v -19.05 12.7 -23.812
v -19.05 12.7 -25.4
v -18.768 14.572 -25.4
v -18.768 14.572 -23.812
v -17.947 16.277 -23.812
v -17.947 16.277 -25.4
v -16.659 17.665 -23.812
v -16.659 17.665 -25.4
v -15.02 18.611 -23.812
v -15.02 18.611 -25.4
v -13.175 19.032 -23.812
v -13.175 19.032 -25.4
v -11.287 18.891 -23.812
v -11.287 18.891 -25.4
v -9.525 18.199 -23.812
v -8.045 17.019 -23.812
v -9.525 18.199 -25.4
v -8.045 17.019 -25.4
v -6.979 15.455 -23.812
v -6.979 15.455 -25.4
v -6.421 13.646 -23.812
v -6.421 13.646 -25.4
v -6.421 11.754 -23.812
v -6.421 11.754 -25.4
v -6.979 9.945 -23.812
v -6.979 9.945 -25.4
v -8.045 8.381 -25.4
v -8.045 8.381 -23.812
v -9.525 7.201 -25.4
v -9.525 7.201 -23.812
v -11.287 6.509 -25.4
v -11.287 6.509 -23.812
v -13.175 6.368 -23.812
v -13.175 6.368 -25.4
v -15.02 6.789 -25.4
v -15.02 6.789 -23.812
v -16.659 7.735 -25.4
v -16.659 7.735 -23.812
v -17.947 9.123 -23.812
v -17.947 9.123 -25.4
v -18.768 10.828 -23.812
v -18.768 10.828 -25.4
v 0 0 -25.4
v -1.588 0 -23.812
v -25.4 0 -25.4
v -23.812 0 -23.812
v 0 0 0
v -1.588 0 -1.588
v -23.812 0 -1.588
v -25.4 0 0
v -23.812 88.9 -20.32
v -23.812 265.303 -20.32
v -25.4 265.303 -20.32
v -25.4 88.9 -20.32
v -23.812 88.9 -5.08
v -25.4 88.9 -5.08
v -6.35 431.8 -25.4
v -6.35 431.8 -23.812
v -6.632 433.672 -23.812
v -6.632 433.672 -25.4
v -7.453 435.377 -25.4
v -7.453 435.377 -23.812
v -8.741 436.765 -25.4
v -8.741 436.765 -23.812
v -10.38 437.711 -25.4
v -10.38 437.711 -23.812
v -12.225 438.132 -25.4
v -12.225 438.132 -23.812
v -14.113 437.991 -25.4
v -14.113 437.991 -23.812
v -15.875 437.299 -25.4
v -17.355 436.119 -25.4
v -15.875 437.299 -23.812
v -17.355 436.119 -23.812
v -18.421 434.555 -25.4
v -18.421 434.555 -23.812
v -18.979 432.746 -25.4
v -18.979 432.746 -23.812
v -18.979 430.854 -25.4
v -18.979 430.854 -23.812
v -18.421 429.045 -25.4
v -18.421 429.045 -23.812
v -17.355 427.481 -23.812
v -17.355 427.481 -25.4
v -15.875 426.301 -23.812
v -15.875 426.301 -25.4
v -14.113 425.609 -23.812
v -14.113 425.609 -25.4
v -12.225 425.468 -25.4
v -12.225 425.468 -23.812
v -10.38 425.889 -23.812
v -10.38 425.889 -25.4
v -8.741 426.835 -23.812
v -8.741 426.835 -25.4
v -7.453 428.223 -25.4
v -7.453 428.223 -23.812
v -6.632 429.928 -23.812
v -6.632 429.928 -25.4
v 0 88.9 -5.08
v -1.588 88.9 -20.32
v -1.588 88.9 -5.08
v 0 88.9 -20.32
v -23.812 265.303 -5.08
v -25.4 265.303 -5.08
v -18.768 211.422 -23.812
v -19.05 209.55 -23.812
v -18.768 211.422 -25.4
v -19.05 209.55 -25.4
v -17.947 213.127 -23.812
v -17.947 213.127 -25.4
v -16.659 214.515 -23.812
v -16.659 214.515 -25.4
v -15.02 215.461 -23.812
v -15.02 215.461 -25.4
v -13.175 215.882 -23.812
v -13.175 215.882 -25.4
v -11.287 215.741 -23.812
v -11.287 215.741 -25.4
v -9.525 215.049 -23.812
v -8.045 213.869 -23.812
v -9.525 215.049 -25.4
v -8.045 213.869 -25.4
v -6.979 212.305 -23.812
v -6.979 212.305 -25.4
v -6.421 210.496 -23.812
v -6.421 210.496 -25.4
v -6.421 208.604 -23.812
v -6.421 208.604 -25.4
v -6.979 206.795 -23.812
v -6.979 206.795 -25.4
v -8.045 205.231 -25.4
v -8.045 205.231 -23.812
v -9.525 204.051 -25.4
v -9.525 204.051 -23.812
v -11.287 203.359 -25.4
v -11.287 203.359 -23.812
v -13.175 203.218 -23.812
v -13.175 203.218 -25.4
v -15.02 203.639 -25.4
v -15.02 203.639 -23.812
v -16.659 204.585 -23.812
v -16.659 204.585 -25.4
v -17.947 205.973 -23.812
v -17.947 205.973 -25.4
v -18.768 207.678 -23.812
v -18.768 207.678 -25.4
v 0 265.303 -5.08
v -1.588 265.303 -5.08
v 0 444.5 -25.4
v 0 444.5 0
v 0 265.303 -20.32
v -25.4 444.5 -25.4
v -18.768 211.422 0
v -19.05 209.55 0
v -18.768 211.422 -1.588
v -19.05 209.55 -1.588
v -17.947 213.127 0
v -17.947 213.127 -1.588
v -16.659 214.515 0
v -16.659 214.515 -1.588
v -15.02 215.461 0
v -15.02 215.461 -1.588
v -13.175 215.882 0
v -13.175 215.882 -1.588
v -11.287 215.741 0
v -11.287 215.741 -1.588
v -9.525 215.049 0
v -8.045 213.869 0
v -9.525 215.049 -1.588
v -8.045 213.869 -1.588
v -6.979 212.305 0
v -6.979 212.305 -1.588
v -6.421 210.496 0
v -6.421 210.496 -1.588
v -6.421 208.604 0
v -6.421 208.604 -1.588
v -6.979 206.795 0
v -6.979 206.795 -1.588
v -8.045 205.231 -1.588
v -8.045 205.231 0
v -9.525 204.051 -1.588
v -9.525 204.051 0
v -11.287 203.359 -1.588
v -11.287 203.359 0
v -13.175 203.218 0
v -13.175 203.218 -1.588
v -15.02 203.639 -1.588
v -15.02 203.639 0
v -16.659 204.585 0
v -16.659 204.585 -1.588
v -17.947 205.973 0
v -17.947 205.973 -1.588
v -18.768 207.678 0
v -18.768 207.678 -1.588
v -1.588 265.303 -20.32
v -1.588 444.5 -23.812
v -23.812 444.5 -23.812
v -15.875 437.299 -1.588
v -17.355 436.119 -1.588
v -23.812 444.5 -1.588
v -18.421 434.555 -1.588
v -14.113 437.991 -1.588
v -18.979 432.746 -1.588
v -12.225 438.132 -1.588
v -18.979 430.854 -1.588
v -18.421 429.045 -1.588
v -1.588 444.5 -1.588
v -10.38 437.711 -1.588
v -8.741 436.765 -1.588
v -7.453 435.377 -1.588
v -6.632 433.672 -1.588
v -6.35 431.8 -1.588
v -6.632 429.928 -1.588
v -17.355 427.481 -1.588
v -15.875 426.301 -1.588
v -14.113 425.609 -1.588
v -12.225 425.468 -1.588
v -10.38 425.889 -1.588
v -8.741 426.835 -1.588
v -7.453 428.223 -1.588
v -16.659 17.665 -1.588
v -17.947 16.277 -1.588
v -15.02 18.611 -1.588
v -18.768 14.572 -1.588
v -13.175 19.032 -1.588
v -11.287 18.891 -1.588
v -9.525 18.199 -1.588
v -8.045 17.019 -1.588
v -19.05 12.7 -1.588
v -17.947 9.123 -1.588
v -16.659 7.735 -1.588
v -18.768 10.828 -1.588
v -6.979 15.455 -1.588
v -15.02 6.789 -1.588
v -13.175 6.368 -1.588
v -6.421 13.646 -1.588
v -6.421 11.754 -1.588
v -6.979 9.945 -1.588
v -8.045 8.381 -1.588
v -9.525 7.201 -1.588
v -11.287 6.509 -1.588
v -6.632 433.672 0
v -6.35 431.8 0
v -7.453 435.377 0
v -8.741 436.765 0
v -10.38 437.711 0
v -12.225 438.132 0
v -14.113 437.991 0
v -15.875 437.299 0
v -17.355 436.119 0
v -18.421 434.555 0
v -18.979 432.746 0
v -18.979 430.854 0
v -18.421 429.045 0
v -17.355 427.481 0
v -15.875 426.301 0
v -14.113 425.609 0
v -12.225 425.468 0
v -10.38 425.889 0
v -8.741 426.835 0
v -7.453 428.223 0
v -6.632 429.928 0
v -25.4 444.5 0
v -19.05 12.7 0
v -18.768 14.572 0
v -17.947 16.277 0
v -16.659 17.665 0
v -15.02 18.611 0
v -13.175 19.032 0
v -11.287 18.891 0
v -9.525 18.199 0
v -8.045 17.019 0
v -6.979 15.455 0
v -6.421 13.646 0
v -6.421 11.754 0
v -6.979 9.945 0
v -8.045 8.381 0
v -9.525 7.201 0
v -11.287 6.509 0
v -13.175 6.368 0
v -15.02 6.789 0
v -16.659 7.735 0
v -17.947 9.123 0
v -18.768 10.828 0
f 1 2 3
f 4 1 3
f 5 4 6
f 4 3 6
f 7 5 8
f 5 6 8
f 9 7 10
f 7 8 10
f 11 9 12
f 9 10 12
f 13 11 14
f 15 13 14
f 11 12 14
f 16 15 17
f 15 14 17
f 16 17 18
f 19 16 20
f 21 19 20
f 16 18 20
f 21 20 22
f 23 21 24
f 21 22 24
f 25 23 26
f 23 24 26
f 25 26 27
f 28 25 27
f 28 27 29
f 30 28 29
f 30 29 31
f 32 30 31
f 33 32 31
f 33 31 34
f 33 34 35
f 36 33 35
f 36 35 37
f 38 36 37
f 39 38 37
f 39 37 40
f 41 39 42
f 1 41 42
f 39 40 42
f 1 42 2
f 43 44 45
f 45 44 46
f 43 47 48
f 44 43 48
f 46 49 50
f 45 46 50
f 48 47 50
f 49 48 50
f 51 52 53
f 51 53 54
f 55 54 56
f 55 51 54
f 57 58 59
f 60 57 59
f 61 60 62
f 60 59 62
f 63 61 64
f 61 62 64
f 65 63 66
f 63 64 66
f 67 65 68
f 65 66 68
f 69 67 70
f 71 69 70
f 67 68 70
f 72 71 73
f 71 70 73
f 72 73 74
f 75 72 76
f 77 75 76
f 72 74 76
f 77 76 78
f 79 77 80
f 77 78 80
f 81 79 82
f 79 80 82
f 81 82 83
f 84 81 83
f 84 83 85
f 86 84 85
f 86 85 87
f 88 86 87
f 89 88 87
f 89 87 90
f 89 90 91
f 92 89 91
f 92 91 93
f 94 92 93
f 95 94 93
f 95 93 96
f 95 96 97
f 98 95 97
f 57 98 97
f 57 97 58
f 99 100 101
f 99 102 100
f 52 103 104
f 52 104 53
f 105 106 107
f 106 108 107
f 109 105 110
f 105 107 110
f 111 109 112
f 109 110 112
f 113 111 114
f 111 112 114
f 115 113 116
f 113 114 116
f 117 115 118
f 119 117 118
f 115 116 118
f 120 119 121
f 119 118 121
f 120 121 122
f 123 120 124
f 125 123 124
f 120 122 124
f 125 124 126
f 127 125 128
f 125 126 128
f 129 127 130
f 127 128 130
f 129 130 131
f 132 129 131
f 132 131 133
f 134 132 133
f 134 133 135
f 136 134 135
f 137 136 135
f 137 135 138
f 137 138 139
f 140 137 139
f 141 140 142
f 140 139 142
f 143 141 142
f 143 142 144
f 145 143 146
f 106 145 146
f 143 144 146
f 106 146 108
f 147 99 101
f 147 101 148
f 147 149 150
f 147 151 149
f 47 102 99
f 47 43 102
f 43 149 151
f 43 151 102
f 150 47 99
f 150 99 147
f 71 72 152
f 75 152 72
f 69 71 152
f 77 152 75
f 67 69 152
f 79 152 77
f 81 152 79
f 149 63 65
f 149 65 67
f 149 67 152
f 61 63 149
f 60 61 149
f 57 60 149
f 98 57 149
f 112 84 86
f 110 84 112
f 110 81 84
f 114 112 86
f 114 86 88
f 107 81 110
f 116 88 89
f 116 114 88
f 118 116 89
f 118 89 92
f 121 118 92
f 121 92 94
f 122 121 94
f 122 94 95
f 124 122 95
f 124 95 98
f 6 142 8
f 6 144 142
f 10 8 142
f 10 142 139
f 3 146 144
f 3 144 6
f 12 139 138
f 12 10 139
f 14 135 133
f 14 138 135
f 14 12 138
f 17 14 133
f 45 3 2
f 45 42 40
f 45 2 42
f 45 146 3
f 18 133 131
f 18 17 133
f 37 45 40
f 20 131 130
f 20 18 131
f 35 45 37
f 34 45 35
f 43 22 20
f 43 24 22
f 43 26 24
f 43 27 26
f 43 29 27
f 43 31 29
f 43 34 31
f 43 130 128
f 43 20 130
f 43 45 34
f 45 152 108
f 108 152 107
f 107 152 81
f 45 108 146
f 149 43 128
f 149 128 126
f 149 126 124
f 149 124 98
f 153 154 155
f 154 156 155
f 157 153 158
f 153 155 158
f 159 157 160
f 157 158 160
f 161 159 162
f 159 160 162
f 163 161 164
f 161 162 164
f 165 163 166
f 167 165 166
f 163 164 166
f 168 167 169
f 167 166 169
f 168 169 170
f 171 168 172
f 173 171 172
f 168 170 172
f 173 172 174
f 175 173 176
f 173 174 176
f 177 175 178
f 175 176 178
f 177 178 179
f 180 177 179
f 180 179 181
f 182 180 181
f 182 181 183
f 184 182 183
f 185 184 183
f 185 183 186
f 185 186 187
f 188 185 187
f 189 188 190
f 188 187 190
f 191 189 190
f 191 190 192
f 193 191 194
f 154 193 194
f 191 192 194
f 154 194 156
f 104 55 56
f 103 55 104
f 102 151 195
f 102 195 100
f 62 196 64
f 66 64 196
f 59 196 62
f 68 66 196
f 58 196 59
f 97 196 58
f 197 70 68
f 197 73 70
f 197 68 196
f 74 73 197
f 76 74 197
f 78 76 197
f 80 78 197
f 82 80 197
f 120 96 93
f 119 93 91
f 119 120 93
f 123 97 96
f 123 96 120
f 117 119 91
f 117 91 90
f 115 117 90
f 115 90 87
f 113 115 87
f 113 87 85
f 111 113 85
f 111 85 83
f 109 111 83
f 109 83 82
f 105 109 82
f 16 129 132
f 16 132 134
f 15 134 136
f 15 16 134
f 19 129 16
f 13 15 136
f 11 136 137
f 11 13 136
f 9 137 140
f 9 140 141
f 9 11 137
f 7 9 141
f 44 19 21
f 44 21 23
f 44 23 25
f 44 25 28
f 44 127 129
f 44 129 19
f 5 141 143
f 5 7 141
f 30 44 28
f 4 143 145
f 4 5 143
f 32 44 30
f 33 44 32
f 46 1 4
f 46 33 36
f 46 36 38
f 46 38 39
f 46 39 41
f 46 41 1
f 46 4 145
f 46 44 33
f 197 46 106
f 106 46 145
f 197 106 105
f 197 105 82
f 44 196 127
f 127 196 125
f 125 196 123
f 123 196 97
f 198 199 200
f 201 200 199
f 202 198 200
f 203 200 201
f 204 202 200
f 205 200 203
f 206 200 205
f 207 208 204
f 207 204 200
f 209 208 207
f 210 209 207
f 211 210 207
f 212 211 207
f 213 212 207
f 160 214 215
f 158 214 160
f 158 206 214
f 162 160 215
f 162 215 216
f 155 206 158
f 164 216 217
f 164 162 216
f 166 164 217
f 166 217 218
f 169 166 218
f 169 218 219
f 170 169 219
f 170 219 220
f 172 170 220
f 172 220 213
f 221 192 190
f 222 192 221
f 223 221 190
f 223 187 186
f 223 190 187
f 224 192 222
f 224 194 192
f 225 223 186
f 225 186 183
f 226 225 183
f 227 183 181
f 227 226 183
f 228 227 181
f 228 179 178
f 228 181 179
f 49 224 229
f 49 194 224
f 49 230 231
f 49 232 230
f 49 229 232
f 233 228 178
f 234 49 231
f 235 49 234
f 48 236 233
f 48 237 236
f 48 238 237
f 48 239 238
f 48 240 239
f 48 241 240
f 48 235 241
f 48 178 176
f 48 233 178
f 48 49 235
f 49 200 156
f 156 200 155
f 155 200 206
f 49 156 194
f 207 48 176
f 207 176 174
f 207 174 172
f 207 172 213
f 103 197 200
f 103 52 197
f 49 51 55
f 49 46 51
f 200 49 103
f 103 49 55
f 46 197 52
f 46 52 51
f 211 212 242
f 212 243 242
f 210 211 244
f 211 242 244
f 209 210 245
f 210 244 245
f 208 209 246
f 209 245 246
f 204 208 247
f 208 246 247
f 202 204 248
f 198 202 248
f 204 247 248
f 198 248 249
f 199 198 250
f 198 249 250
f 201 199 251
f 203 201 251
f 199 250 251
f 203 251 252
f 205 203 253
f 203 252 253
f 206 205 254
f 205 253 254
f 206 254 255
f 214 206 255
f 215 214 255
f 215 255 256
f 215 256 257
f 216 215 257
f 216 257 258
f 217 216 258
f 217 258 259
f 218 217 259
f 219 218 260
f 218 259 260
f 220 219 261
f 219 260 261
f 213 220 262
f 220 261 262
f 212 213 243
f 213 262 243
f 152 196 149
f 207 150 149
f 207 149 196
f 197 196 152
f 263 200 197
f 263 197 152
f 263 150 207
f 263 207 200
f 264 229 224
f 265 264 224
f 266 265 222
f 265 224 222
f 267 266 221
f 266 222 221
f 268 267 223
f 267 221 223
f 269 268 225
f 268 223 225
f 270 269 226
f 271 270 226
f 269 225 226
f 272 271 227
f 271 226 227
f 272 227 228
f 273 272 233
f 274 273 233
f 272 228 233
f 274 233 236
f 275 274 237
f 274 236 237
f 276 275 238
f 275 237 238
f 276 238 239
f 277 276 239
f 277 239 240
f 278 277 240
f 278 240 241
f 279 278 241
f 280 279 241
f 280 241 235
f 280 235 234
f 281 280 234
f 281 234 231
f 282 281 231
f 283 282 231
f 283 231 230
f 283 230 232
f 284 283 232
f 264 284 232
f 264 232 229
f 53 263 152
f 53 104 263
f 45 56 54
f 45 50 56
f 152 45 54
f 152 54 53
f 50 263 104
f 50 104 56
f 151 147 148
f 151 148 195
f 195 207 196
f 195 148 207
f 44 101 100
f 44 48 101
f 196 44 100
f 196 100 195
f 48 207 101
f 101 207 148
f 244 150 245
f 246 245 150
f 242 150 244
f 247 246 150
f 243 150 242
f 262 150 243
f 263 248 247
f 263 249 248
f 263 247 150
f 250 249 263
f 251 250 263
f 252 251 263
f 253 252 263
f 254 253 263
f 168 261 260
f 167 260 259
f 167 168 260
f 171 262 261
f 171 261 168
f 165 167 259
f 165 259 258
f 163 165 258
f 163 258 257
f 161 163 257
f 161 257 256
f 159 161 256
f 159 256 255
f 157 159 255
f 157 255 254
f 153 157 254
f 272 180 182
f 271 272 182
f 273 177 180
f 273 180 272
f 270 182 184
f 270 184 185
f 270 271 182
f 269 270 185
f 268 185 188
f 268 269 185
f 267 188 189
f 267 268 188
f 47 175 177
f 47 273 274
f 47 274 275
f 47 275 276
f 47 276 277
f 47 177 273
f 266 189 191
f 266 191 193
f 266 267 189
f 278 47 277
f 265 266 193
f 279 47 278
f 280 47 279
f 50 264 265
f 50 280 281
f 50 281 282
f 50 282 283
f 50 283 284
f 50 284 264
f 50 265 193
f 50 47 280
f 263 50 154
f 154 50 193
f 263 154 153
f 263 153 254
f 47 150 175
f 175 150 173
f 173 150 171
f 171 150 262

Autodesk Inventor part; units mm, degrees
ref_plane "YZ Plane" through (0, 0, 0) normal (1, 0, 0) x (0, 1, 0)
ref_plane "XZ Plane" through (0, 0, 0) normal (0, 1, 0) x (-1, 0, 0)
ref_plane "XY Plane" through (0, 0, 0) normal (0, 0, 1) x (1, 0, 0)
sketch "Sketch1" plane through (0, 0, 0) normal (0, 1, 0) x (-1, 0, 0)
  line L0 (0, 0) -> (25.4, 0)
  line L1 (25.4, 0) -> (25.4, -25.4)
  line L2 (25.4, -25.4) -> (0, -25.4)
  line L3 (0, -25.4) -> (0, 0)
  line L4 (23.8125, -23.8125) -> (23.8125, -1.5875)
  line L5 (23.8125, -1.5875) -> (1.5875, -1.5875)
  line L6 (1.5875, -1.5875) -> (1.5875, -23.8125)
  line L7 (1.5875, -23.8125) -> (23.8125, -23.8125)
  dimension "d0" = 25.4
  dimension "d1" = 25.4
  dimension "d2" = 1.5875
extrude "Extrusion1" add sketch "Sketch1" along normal blind 444.5
sketch "Sketch2" plane through (-25.4, 0, 0) normal (0, 0, 1) x (1, 0, 0)
  circle A0 centre (12.7, 431.8) radius 6.35
  line L0 (0, 444.5) -> (25.4, 444.5) projected
  point P0 (25.4, 0)
  dimension "d5" = 12.7
  dimension "d6" = 12.7
extrude "Extrusion2" cut sketch "Sketch2" against normal blind 25.4
sketch "Sketch4" plane through (0, 0, -25.4) normal (0, 0, -1) x (-1, 0, 0)
  circle A0 centre (12.7, 12.7) radius 6.35
  line L0 (25.4, 0) -> (0, 0) projected
  line L1 (0, 0) -> (0, 444.5) projected
  dimension "d17" = 12.7
  dimension "d18" = 12.7
  dimension "d19" = 12.7
extrude "Extrusion4" cut sketch "Sketch4" against normal blind 25.4
sketch "Sketch5" plane through (0, 0, -25.4) normal (0, 0, -1) x (-1, 0, 0)
  circle A0 centre (12.7, 209.55) radius 6.35
  line L0 (0, 0) -> (0, 444.5) projected
  line L1 (0, 444.5) -> (25.4, 444.5) projected
  dimension "d22" = 12.7
  dimension "d23" = 12.7
  dimension "d24" = 234.95
extrude "Extrusion5" cut sketch "Sketch5" against normal blind 25.4
sketch "Sketch6" plane through (0, 0, 0) normal (1, 0, 0) x (0, 0, -1)
  line L0 (5.08, 265.303) -> (20.32, 265.303)
  line L1 (20.32, 265.303) -> (20.32, 88.9)
  line L2 (20.32, 88.9) -> (5.08, 88.9)
  line L3 (5.08, 88.9) -> (5.08, 265.303)
  line L4 (23.8125, 444.5) -> (1.5875, 444.5) projected
  line L5 (25.4, 0) -> (25.4, 444.5) projected
  line L6 (0, 0) -> (0, 444.5) projected
  line L7 (25.4, 0) -> (0, 0) projected
  dimension "d28" = 5.08
  dimension "d29" = 5.08
  dimension "d30" = 176.403
  dimension "d33" = 88.9
extrude "Extrusion6" cut sketch "Sketch6" against normal blind 25.4
properties part number "AP 5"
